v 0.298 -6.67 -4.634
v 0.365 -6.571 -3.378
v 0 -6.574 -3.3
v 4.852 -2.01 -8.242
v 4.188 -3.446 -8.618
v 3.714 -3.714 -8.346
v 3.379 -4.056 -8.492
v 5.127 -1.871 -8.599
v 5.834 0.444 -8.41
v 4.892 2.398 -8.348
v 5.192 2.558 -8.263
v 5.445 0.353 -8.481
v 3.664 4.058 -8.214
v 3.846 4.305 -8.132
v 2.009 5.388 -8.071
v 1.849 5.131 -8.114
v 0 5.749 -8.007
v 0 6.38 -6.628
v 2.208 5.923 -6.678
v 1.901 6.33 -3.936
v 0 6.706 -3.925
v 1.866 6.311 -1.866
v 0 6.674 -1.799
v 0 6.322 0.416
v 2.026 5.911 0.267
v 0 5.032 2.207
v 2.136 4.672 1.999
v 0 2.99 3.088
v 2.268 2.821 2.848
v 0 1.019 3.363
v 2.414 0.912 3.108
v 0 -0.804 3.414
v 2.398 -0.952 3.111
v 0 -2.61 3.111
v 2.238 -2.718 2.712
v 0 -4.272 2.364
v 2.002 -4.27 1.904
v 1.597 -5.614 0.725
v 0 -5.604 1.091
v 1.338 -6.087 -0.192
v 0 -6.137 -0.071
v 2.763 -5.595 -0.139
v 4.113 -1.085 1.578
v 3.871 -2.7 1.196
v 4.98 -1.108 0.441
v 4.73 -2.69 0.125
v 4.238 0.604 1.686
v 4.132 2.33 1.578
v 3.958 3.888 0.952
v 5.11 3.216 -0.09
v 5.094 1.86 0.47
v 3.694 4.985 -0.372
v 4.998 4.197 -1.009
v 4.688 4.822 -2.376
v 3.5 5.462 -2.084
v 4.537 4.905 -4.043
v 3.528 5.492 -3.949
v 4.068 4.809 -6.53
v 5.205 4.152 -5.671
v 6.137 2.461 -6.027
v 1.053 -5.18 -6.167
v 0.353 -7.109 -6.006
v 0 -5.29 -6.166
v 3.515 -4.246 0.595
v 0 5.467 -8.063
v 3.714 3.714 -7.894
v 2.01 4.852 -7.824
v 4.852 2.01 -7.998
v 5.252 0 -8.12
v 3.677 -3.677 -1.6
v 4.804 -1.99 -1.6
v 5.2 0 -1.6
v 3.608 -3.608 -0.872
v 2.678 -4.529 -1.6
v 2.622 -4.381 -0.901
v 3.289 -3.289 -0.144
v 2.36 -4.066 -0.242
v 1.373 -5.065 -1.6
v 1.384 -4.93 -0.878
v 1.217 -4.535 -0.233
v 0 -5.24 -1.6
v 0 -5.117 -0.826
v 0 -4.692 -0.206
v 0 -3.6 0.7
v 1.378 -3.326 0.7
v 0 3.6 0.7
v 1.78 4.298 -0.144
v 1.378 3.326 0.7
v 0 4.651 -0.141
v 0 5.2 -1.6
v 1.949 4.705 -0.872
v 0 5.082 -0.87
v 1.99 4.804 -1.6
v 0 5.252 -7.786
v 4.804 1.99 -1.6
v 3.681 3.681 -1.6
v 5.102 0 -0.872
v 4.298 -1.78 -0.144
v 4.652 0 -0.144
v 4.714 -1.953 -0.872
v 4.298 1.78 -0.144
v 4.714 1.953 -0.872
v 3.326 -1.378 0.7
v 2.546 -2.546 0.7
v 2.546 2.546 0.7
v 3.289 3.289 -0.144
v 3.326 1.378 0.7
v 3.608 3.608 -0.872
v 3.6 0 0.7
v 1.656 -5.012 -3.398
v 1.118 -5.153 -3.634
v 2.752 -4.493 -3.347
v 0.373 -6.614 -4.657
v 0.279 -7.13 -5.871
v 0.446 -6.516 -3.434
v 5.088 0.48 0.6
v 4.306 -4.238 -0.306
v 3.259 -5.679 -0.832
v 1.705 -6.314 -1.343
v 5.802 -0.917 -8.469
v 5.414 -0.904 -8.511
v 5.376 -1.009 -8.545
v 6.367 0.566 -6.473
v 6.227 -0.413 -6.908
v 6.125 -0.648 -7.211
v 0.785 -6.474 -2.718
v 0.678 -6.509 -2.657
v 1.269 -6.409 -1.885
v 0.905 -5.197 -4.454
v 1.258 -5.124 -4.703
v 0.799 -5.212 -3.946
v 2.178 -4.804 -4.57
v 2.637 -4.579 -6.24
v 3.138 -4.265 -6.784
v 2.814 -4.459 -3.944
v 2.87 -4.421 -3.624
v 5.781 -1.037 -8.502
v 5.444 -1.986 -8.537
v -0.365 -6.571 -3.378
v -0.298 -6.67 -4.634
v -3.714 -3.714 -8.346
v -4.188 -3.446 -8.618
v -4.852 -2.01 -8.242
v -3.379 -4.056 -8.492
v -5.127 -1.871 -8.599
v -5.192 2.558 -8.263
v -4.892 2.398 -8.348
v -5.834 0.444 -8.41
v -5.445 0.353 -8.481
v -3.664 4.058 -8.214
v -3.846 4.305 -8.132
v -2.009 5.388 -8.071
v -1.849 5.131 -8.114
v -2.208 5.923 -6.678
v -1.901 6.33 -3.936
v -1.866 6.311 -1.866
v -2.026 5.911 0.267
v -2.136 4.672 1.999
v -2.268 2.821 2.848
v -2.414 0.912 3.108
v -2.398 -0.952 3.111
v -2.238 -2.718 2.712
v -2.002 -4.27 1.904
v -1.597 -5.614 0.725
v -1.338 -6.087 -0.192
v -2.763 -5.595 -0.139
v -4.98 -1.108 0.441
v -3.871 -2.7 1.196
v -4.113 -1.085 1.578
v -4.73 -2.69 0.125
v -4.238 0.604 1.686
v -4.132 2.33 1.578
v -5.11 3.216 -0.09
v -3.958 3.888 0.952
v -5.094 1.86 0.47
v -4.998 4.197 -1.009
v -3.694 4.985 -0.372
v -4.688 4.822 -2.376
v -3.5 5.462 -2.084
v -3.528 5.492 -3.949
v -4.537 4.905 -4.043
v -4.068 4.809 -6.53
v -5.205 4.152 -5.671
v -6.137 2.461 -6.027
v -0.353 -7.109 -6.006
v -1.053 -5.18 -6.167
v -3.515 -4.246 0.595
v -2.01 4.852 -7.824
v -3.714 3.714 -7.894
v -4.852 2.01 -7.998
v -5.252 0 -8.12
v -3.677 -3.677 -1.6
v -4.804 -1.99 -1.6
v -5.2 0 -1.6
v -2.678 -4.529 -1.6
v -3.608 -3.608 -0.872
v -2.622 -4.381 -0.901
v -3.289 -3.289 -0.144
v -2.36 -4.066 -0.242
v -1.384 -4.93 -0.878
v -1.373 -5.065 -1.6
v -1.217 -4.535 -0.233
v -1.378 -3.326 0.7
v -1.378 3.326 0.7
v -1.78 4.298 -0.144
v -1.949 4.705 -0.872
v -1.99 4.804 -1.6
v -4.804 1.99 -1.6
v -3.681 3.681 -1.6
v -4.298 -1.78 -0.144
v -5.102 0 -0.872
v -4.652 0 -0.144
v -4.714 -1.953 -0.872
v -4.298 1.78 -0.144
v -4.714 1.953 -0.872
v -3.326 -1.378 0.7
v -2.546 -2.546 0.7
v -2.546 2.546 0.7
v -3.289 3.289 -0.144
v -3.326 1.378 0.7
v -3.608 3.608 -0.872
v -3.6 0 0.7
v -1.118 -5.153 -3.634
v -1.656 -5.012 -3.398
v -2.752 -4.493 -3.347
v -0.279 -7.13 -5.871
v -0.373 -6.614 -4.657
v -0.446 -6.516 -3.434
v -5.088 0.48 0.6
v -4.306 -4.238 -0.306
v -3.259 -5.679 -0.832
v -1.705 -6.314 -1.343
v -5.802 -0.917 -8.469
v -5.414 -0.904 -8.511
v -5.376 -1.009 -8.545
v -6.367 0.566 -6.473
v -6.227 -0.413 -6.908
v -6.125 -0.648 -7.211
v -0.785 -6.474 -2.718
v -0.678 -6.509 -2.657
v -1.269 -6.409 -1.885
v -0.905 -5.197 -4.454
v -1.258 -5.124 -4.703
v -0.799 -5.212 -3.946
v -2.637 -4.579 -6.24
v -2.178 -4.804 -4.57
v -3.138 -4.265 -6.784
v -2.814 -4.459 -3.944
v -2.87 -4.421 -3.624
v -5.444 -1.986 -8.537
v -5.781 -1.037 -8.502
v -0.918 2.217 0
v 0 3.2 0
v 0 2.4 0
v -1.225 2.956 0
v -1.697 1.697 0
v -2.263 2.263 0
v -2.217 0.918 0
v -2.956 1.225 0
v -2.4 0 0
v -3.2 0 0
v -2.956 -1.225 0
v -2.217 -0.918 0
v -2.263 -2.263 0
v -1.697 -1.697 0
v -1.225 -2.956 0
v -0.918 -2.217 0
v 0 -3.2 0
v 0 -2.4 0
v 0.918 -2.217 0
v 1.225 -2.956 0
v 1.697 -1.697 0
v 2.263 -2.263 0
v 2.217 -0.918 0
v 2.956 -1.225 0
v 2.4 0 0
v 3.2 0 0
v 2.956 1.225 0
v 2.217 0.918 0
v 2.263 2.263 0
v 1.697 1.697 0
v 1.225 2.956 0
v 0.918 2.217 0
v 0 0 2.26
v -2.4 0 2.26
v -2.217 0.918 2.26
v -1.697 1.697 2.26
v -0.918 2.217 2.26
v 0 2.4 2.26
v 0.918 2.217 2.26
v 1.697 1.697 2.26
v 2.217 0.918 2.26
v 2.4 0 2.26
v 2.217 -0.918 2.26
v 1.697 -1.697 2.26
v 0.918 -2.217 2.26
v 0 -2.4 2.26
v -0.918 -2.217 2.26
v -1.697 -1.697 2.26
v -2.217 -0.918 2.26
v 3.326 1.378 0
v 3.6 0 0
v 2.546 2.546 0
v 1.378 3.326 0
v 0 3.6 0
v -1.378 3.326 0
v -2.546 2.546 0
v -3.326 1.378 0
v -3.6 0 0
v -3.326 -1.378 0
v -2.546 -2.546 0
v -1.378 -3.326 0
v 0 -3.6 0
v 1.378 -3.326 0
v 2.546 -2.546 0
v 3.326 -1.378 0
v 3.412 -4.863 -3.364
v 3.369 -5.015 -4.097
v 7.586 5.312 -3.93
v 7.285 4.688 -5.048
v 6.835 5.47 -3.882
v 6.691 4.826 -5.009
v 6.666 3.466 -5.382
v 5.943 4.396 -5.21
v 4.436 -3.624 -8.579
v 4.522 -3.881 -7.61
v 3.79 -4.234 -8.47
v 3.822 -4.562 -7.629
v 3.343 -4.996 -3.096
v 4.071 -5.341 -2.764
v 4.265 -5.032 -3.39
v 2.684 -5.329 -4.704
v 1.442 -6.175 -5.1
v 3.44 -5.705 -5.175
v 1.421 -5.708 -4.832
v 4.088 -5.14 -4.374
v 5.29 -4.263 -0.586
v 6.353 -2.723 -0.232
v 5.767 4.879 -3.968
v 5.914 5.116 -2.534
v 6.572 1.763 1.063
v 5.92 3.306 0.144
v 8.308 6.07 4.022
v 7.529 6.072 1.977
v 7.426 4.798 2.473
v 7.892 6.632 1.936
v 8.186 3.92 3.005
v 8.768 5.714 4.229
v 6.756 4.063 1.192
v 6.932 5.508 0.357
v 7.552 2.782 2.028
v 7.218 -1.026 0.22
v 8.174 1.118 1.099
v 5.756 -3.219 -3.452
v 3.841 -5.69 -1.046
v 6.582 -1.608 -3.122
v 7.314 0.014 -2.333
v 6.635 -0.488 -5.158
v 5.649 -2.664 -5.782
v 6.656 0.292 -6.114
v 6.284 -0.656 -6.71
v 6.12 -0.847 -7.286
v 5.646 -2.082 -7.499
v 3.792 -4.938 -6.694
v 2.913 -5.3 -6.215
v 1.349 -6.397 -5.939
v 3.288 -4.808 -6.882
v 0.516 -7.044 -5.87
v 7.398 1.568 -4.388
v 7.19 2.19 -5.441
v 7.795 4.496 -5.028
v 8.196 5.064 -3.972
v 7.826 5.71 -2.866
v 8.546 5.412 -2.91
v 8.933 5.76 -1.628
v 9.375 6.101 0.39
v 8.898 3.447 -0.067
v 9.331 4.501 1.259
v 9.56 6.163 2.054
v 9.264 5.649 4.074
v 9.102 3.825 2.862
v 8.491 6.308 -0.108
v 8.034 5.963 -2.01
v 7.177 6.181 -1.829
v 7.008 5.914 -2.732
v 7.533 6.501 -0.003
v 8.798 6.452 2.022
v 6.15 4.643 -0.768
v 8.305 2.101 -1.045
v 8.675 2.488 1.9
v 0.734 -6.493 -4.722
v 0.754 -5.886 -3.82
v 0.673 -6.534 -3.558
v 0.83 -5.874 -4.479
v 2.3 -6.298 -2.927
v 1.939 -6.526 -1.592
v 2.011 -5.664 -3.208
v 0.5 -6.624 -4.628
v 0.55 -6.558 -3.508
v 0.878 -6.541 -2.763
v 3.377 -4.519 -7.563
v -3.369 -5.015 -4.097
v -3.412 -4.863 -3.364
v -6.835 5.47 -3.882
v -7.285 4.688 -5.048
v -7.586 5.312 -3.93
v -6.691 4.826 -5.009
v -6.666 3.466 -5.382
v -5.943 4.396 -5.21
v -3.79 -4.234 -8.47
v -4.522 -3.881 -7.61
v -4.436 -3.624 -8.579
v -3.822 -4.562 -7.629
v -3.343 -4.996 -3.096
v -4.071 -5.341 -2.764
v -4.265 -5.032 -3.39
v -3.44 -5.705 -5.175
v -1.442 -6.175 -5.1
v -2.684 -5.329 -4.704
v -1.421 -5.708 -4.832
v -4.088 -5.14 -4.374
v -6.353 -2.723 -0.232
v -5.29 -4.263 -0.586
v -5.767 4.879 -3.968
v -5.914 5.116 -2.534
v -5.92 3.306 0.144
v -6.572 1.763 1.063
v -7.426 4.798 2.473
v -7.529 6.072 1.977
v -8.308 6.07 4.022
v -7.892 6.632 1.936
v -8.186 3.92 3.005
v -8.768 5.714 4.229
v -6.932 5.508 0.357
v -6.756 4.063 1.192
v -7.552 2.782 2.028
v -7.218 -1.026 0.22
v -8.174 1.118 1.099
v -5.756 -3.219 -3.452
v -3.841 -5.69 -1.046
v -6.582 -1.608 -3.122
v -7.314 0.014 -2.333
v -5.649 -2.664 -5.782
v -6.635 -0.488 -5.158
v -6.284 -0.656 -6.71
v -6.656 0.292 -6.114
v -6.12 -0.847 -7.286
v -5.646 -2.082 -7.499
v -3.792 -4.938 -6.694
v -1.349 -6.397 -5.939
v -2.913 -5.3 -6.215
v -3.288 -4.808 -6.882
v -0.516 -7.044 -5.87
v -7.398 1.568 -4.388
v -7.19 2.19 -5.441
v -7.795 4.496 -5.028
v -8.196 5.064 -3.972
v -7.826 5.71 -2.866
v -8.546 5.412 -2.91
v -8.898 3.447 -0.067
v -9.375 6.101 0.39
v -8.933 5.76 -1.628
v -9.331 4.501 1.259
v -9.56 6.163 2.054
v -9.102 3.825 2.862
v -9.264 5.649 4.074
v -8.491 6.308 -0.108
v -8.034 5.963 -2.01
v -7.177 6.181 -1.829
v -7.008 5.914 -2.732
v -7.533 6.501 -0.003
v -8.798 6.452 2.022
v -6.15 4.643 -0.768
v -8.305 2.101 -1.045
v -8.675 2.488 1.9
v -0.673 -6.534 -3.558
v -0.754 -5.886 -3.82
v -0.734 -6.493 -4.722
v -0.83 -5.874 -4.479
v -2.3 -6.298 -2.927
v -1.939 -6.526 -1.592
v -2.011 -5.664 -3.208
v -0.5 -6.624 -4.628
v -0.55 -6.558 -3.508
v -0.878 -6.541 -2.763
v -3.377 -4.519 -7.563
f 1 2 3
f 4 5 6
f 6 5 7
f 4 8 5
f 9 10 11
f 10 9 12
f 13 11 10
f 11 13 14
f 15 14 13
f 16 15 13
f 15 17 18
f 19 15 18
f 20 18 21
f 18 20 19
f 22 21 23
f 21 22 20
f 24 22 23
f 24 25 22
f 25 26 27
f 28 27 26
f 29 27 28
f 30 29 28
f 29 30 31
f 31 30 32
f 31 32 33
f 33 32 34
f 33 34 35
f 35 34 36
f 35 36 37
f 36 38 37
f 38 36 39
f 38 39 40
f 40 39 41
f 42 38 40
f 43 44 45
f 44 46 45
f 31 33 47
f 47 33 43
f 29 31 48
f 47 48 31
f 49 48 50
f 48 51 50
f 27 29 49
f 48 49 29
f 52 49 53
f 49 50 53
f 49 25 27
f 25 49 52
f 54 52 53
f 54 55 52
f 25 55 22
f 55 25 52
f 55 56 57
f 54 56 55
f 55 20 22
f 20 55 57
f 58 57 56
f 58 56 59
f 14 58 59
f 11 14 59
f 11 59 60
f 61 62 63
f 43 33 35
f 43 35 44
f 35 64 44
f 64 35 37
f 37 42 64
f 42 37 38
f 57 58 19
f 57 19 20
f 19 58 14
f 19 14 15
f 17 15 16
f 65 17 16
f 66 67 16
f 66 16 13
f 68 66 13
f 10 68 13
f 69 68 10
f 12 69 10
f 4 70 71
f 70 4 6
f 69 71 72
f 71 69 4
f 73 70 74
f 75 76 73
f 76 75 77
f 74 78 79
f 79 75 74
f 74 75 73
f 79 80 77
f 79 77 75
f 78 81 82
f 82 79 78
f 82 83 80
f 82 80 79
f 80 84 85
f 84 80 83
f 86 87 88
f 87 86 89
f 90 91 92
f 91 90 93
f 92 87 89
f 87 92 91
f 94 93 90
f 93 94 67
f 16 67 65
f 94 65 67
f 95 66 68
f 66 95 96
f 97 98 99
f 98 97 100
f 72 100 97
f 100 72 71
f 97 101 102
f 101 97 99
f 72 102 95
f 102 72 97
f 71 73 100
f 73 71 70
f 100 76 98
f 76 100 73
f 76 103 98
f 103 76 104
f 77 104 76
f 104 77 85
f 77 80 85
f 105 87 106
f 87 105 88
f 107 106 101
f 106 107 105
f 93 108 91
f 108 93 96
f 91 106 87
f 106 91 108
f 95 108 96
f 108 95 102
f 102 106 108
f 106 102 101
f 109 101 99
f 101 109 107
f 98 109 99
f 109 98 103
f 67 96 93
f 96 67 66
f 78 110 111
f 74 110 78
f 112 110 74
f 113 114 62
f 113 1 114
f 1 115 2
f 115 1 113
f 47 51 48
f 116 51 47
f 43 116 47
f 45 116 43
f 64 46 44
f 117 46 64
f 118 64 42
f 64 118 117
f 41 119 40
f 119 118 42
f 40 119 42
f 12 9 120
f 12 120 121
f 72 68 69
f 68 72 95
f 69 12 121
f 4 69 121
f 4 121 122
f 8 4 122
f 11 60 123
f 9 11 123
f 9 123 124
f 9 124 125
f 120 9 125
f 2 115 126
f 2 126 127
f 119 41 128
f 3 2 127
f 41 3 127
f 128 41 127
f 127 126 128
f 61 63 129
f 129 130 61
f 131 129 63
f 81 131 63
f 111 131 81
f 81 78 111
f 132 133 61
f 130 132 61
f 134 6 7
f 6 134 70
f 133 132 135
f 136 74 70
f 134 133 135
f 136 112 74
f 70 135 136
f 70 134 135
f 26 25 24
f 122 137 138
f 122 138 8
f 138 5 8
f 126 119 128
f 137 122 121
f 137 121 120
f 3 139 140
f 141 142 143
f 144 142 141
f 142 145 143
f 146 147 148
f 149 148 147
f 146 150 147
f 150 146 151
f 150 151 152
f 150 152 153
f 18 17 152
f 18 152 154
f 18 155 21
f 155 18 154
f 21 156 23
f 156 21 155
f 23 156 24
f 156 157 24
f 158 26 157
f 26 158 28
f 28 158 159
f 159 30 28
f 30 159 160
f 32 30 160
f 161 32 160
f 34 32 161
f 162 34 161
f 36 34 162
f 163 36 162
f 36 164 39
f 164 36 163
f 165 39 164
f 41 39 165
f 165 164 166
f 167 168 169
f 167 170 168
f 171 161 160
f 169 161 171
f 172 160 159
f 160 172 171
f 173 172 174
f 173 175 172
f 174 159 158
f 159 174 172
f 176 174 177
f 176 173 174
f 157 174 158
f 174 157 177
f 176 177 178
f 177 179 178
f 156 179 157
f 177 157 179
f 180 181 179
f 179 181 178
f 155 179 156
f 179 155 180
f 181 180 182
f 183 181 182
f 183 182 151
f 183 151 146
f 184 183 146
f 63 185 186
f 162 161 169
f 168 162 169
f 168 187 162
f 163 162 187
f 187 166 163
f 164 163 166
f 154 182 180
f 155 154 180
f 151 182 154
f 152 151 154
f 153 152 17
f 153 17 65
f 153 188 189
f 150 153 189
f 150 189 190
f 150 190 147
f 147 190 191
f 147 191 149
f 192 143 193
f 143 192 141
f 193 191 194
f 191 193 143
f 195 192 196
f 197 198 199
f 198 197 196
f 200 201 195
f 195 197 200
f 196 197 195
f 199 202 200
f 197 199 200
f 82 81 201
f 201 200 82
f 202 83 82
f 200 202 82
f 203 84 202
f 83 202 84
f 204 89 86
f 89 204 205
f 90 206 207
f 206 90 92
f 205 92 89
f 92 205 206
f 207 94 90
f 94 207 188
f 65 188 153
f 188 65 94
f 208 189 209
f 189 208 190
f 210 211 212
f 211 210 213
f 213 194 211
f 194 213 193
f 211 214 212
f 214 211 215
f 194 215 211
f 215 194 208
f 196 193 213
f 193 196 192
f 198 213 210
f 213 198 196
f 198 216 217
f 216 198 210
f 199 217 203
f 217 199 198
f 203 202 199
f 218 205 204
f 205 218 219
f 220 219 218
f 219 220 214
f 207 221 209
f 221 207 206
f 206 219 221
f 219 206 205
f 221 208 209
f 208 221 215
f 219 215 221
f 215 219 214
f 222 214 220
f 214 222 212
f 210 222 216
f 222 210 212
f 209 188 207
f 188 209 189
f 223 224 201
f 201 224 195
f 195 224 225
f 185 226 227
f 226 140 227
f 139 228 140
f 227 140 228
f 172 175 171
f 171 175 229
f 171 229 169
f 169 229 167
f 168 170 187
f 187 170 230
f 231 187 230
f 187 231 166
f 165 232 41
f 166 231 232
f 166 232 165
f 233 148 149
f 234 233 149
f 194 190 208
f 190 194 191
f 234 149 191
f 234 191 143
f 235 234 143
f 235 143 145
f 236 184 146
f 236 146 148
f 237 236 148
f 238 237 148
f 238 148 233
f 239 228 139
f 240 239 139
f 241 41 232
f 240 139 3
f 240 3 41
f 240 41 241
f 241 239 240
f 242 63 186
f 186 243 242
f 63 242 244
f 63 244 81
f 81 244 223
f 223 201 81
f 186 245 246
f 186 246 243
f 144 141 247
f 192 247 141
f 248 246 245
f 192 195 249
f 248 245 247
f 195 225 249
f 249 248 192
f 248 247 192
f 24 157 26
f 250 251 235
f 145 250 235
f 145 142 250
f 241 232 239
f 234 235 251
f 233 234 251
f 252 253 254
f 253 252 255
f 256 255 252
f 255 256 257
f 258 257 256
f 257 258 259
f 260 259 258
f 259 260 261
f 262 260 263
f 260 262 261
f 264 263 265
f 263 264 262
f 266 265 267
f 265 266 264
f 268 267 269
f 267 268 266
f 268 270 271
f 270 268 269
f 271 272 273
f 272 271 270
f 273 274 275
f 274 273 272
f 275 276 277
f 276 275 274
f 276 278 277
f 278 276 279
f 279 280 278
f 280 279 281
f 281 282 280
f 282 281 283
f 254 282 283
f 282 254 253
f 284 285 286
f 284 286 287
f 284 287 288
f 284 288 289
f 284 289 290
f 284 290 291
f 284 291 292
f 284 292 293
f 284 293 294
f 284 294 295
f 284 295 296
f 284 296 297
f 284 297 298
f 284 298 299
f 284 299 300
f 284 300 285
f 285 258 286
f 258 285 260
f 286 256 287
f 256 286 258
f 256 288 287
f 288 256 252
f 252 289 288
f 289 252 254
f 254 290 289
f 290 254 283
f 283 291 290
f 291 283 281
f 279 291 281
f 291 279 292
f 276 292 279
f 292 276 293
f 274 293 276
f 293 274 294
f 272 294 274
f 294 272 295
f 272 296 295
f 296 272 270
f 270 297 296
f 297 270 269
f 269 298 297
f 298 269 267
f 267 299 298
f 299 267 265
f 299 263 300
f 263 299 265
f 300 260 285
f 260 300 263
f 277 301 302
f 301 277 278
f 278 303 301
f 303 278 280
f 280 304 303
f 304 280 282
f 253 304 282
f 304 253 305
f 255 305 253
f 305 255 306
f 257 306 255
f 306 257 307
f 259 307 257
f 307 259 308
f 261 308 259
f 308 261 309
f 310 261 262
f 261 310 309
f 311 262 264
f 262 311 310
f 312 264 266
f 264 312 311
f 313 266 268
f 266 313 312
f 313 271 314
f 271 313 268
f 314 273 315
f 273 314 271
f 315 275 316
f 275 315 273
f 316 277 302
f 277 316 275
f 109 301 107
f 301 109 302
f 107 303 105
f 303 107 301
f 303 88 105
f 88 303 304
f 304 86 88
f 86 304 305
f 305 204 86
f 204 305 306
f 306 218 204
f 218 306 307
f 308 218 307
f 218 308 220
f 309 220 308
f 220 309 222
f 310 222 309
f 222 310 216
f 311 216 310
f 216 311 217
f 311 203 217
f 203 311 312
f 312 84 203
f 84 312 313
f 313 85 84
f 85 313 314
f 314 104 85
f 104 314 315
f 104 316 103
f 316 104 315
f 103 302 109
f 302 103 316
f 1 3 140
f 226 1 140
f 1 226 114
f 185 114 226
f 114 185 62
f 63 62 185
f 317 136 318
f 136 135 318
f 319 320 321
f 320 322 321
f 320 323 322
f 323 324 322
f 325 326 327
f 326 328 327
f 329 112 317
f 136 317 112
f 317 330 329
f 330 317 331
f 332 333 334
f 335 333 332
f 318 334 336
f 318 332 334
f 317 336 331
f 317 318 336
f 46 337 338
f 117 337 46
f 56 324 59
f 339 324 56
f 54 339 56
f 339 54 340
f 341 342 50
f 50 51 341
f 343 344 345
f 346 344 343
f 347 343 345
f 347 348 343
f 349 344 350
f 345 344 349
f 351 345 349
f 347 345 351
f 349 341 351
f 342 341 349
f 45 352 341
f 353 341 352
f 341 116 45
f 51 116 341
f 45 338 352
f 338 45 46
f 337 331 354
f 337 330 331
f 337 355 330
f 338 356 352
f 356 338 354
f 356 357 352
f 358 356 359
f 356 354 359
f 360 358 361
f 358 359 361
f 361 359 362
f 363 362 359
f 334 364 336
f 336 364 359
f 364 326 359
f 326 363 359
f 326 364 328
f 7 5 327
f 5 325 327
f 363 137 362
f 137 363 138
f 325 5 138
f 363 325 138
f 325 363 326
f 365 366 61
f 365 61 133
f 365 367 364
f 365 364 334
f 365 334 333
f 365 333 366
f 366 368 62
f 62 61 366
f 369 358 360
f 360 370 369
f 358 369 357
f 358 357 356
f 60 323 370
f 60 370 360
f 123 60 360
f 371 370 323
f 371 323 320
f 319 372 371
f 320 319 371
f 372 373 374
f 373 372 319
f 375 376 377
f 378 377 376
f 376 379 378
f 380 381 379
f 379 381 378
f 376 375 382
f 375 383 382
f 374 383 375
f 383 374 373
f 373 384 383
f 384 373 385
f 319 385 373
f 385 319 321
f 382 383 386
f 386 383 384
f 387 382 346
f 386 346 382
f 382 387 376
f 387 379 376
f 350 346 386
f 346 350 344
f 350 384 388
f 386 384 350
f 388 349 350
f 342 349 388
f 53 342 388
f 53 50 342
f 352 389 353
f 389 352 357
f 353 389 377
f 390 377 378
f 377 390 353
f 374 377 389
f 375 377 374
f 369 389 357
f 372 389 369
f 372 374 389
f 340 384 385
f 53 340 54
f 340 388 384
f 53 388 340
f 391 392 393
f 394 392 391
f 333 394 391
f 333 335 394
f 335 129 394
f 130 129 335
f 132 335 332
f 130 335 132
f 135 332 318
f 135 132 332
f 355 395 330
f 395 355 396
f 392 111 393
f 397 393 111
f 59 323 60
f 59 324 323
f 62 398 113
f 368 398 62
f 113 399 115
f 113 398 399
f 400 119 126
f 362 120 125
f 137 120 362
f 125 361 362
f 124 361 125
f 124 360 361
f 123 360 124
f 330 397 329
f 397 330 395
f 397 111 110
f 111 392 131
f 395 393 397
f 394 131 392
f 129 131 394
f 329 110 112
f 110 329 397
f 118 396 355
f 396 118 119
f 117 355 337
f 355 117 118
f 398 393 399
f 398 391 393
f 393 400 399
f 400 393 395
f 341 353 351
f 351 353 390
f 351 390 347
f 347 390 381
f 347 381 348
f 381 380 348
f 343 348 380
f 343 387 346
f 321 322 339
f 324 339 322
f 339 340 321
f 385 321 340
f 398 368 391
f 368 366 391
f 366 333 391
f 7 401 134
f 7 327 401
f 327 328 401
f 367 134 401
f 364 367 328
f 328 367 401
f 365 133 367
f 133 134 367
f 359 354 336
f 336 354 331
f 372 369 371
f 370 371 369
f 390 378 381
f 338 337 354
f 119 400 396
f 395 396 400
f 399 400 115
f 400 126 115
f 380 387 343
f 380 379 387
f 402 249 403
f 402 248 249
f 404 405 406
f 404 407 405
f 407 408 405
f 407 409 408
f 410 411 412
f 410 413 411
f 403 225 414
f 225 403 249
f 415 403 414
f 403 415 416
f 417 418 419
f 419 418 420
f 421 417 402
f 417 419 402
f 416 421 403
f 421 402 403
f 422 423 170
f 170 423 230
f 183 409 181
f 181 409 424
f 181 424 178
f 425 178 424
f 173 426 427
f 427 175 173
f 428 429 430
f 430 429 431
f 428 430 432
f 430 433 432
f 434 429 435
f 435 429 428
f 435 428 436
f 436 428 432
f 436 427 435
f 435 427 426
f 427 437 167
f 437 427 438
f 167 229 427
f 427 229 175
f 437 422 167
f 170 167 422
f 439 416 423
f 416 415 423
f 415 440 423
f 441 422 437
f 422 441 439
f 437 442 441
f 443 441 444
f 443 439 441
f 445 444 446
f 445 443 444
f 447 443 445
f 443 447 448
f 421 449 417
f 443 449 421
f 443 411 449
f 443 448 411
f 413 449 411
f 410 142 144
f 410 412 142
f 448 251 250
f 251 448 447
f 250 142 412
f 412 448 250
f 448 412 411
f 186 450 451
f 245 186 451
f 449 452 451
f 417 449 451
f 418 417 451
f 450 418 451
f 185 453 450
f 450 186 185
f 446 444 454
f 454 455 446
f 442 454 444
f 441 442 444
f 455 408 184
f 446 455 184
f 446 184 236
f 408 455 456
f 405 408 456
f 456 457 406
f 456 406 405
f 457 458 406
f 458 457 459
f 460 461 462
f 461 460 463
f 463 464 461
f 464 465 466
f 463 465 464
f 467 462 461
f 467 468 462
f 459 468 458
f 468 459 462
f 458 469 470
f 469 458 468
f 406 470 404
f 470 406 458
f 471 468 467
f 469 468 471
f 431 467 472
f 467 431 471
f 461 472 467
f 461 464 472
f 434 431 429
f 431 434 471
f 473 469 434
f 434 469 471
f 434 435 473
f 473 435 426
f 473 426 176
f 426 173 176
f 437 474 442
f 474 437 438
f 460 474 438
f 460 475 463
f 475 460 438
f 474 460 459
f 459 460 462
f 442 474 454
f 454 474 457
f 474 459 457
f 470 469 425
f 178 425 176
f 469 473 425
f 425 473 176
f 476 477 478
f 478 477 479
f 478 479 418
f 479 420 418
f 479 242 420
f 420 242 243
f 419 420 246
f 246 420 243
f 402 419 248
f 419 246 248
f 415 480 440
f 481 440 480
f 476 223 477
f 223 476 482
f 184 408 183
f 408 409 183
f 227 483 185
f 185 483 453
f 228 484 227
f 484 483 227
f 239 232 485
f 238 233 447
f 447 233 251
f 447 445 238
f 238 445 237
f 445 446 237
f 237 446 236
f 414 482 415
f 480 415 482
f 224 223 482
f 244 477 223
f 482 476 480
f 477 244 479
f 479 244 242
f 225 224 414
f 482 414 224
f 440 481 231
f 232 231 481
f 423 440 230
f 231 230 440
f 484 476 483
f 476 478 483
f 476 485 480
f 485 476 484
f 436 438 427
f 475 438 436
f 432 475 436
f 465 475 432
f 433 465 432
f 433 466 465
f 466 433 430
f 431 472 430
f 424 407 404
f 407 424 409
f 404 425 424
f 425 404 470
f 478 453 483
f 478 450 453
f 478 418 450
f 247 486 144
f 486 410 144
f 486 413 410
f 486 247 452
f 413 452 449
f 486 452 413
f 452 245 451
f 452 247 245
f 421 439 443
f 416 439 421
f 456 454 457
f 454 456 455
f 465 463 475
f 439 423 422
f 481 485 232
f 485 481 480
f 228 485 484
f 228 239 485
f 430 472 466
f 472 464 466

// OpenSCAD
use <../lib.scad>
use <../p/4-4cylo.scad>
use <../p/4-4ring8.scad>
use <s/17018s01.scad>
use <s/17018s02.scad>
use <../p/stud4o.scad>
function ldraw_lib__17018p01() = [
// 0 Minifig Helmet Wolverine with Black Pattern
// 0 Name: 17018p01.dat
// 0 Author: Magnus Forsberg [MagFors]
// 0 !LDRAW_ORG Part UPDATE 2023-04
// 0 !LICENSE Licensed under CC BY 4.0 : see CAreadme.txt
// 
// 0 BFC CERTIFY CCW
  [0,"BFC","CERTIFY"],
  [0,"BFC","CCW"],
// 
// 0 !CATEGORY Minifig Headwear
// 0 !KEYWORDS Bricklink 17018pb01, Rebrickable 17018pr0001, Set 76022, Set 76202
// 
// 0 !HISTORY 2023-08-25 [OrionP] Official Update 2023-04
// 
// 
// 1 16 0 0 0 1 0 0 0 1 0 0 0 1 s\17018s01.dat
  [1,16,0,0,0,1,0,0,0,1,0,0,0,1, ldraw_lib__s__17018s01()],
// 1 16 0 0 0 -1 0 0 0 1 0 0 0 1 s\17018s01.dat
  [1,16,0,0,0,-1,0,0,0,1,0,0,0,1, ldraw_lib__s__17018s01()],
// 1 16 0 -5.65 0 1 0 0 0 -1.4125 0 0 0 1 stud4o.dat
  [1,16,0,-5.65,0,1,0,0,0,-1.4125,0,0,0,1, ldraw_lib__stud4o()],
// 1 16 0 0 0 1 0 0 0 -1 0 0 0 1 4-4ring8.dat
  [1,16,0,0,0,1,0,0,0,-1,0,0,0,1, ldraw_lib__4_4ring8()],
// 1 16 0 0 0 9 0 0 0 -1.75 0 0 0 9 4-4cylo.dat
  [1,16,0,0,0,9,0,0,0,-1.75,0,0,0,9, ldraw_lib__4_4cylo()],
// 3 16 0.745 11.586 -16.675 0 8.249 -16.435 -0.745 11.586 -16.675
  [3,16,0.745,11.586,-16.675,0,8.249,-16.435,-0.745,11.586,-16.675],
// 4 16 0.745 11.586 -16.675 -0.745 11.586 -16.675 -0.697 14.678 -17.825 0.697 14.678 -17.825
  [4,16,0.745,11.586,-16.675,-0.745,11.586,-16.675,-0.697,14.678,-17.825,0.697,14.678,-17.825],
// 4 16 -0.697 14.678 -17.825 -0.882 15.014 -17.772 0.882 15.014 -17.772 0.697 14.678 -17.825
  [4,16,-0.697,14.678,-17.825,-0.882,15.014,-17.772,0.882,15.014,-17.772,0.697,14.678,-17.825],
// 3 16 0 15.414 -13.2249 0.882 15.014 -17.772 -0.882 15.014 -17.772
  [3,16,0,15.414,-13.2249,0.882,15.014,-17.772,-0.882,15.014,-17.772],
// 5 24 -0.697 14.678 -17.825 0.697 14.678 -17.825 -0.882 15.014 -17.772 -0.745 11.586 -16.675
  [5,24,-0.697,14.678,-17.825,0.697,14.678,-17.825,-0.882,15.014,-17.772,-0.745,11.586,-16.675],
// 5 24 0 -8.535 -2.01 0 -7.778 -6.526 -5.996 -7.777 -2.38 5.996 -7.777 -2.38
  [5,24,0,-8.535,-2.01,0,-7.778,-6.526,-5.996,-7.777,-2.38,5.996,-7.777,-2.38],
// 5 24 0 -5.91 -10.68 0 -2.727 -14.011 -5.006 -4.761 -10.676 5.006 -4.761 -10.676
  [5,24,0,-5.91,-10.68,0,-2.727,-14.011,-5.006,-4.761,-10.676,5.006,-4.761,-10.676],
// 5 24 0 8.249 -16.435 0.745 11.586 -16.675 -0.745 11.586 -16.675 0.912 8.446 -16.427
  [5,24,0,8.249,-16.435,0.745,11.586,-16.675,-0.745,11.586,-16.675,0.912,8.446,-16.427],
// 5 24 0 20.017 14.373 0 16.571 15.951 5.023 20.178 13.469 -5.023 20.178 13.469
  [5,24,0,20.017,14.373,0,16.571,15.951,5.023,20.178,13.469,-5.023,20.178,13.469],
// 5 24 0 9.812 16.764 0 4.498 16.685 4.752 9.839 15.824 -4.752 9.839 15.824
  [5,24,0,9.812,16.764,0,4.498,16.685,4.752,9.839,15.824,-4.752,9.839,15.824],
// 5 24 0 0.177 -15.342 0 8.249 -16.435 -1.695 6.643 -16.273 1.695 6.643 -16.273
  [5,24,0,0.177,-15.342,0,8.249,-16.435,-1.695,6.643,-16.273,1.695,6.643,-16.273],
// 5 24 0 -1.75 9 0 0.352 11.628 -4.4508 0.36 10.745 4.4508 0.36 10.745
  [5,24,0,-1.75,9,0,0.352,11.628,-4.4508,0.36,10.745,4.4508,0.36,10.745],
// 5 24 0 0.514 -11.731 0 -1.75 -9 -3.043 0.582 -11.337 3.043 0.582 -11.337
  [5,24,0,0.514,-11.731,0,-1.75,-9,-3.043,0.582,-11.337,3.043,0.582,-11.337],
// 5 24 0 16.571 15.951 0 9.812 16.764 5.519 16.696 14.807 -5.519 16.696 14.807
  [5,24,0,16.571,15.951,0,9.812,16.764,5.519,16.696,14.807,-5.519,16.696,14.807],
// 5 24 0 -8.408 2.548 0 -8.535 -2.01 -6.034 -7.77 2.28 6.034 -7.77 2.28
  [5,24,0,-8.408,2.548,0,-8.535,-2.01,-6.034,-7.77,2.28,6.034,-7.77,2.28],
// 5 24 -0.882 15.014 -17.772 0 15.414 -13.2249 -2.6321 15.418 -12.9492 0.882 15.014 -17.772
  [5,24,-0.882,15.014,-17.772,0,15.414,-13.2249,-2.6321,15.418,-12.9492,0.882,15.014,-17.772],
// 5 24 0 -7.778 -6.526 0 -5.91 -10.68 -5.595 -6.78 -6.794 5.595 -6.78 -6.794
  [5,24,0,-7.778,-6.526,0,-5.91,-10.68,-5.595,-6.78,-6.794,5.595,-6.78,-6.794],
// 5 24 0 20.157 13.668 0 20.017 14.373 4.622 20.285 12.828 -4.622 20.285 12.828
  [5,24,0,20.157,13.668,0,20.017,14.373,4.622,20.285,12.828,-4.622,20.285,12.828],
// 5 24 0 4.498 16.685 0 -1.041 15.805 4.665 4.665 15.777 -4.665 4.665 15.777
  [5,24,0,4.498,16.685,0,-1.041,15.805,4.665,4.665,15.777,-4.665,4.665,15.777],
// 5 24 0 19.466 13.13 0 20.157 13.668 -5.0249 19.5609 12.1308 5.0249 19.5609 12.1308
  [5,24,0,19.466,13.13,0,20.157,13.668,-5.0249,19.5609,12.1308,5.0249,19.5609,12.1308],
// 5 24 0 -5.518 12.58 0 -7.719 7.474 5.341 -4.998 11.68 -5.341 -4.998 11.68
  [5,24,0,-5.518,12.58,0,-7.719,7.474,5.341,-4.998,11.68,-5.341,-4.998,11.68],
// 2 24 -0.882 15.014 -17.772 0.882 15.014 -17.772
  [2,24,-0.882,15.014,-17.772,0.882,15.014,-17.772],
// 5 24 0 8.249 -16.435 -0.745 11.586 -16.675 -0.912 8.446 -16.427 0.745 11.586 -16.675
  [5,24,0,8.249,-16.435,-0.745,11.586,-16.675,-0.912,8.446,-16.427,0.745,11.586,-16.675],
// 5 24 0 -7.719 7.474 0 -8.408 2.548 5.671 -7.119 7.052 -5.671 -7.119 7.052
  [5,24,0,-7.719,7.474,0,-8.408,2.548,5.671,-7.119,7.052,-5.671,-7.119,7.052],
// 5 24 -0.745 11.586 -16.675 0.745 11.586 -16.675 0 8.249 -16.435 -0.697 14.678 -17.825
  [5,24,-0.745,11.586,-16.675,0.745,11.586,-16.675,0,8.249,-16.435,-0.697,14.678,-17.825],
// 5 24 0 -2.727 -14.011 0 0.177 -15.342 -3.345 0.48 -15.217 3.345 0.48 -15.217
  [5,24,0,-2.727,-14.011,0,0.177,-15.342,-3.345,0.48,-15.217,3.345,0.48,-15.217],
// 5 24 0.882 15.014 -17.772 0 15.414 -13.2249 -0.882 15.014 -17.772 2.6321 15.418 -12.9492
  [5,24,0.882,15.014,-17.772,0,15.414,-13.2249,-0.882,15.014,-17.772,2.6321,15.418,-12.9492],
// 5 24 0 -1.041 15.805 0 -5.518 12.58 5.066 -0.668 14.777 -5.066 -0.668 14.777
  [5,24,0,-1.041,15.805,0,-5.518,12.58,5.066,-0.668,14.777,-5.066,-0.668,14.777],
// 5 24 0 15.414 -13.2249 0 4 -13.1007 1.9968 9.866 -13.03 -1.9968 9.866 -13.03
  [5,24,0,15.414,-13.2249,0,4,-13.1007,1.9968,9.866,-13.03,-1.9968,9.866,-13.03],
// 5 24 0 4 -13.1007 0 2.065 -12.7921 3.4335 4 -12.6624 -3.4335 4 -12.6624
  [5,24,0,4,-13.1007,0,2.065,-12.7921,3.4335,4,-12.6624,-3.4335,4,-12.6624],
// 5 24 0 .514 -11.731 0 2.065 -12.7921 3.043 .582 -11.337 -3.043 .582 -11.337
  [5,24,0,.514,-11.731,0,2.065,-12.7921,3.043,.582,-11.337,-3.043,.582,-11.337],
// 5 24 0 2.176 12.7038 0 .352 11.628 -4.8719 2.18 11.7615 4.8719 2.18 11.7615
  [5,24,0,2.176,12.7038,0,.352,11.628,-4.8719,2.18,11.7615,4.8719,2.18,11.7615],
// 5 24 0 4 13 0 2.176 12.7038 -4.9751 4 12.0107 4.9751 4 12.0107
  [5,24,0,4,13,0,2.176,12.7038,-4.9751,4,12.0107,4.9751,4,12.0107],
// 5 24 0 4 13 0 19.466 13.13 4.9751 4 12.0107 -4.9751 4 12.0107
  [5,24,0,4,13,0,19.466,13.13,4.9751,4,12.0107,-4.9751,4,12.0107],
// 1 0 0 0 0 1 0 0 0 1 0 0 0 1 s\17018s02.dat
  [1,0,0,0,0,1,0,0,0,1,0,0,0,1, ldraw_lib__s__17018s02()],
// 1 0 0 0 0 -1 0 0 0 1 0 0 0 1 s\17018s02.dat
  [1,0,0,0,0,-1,0,0,0,1,0,0,0,1, ldraw_lib__s__17018s02()],
];
module ldraw_lib__17018p01(step=0, col=false, unit=2/5, alt=false, line=0.2, solid=!$preview)
    makepoly(ldraw_lib__17018p01(), step=step, col=col, unit=unit, alt=alt, line=line, solid=solid);
ldraw_lib__17018p01(line=0.2);
